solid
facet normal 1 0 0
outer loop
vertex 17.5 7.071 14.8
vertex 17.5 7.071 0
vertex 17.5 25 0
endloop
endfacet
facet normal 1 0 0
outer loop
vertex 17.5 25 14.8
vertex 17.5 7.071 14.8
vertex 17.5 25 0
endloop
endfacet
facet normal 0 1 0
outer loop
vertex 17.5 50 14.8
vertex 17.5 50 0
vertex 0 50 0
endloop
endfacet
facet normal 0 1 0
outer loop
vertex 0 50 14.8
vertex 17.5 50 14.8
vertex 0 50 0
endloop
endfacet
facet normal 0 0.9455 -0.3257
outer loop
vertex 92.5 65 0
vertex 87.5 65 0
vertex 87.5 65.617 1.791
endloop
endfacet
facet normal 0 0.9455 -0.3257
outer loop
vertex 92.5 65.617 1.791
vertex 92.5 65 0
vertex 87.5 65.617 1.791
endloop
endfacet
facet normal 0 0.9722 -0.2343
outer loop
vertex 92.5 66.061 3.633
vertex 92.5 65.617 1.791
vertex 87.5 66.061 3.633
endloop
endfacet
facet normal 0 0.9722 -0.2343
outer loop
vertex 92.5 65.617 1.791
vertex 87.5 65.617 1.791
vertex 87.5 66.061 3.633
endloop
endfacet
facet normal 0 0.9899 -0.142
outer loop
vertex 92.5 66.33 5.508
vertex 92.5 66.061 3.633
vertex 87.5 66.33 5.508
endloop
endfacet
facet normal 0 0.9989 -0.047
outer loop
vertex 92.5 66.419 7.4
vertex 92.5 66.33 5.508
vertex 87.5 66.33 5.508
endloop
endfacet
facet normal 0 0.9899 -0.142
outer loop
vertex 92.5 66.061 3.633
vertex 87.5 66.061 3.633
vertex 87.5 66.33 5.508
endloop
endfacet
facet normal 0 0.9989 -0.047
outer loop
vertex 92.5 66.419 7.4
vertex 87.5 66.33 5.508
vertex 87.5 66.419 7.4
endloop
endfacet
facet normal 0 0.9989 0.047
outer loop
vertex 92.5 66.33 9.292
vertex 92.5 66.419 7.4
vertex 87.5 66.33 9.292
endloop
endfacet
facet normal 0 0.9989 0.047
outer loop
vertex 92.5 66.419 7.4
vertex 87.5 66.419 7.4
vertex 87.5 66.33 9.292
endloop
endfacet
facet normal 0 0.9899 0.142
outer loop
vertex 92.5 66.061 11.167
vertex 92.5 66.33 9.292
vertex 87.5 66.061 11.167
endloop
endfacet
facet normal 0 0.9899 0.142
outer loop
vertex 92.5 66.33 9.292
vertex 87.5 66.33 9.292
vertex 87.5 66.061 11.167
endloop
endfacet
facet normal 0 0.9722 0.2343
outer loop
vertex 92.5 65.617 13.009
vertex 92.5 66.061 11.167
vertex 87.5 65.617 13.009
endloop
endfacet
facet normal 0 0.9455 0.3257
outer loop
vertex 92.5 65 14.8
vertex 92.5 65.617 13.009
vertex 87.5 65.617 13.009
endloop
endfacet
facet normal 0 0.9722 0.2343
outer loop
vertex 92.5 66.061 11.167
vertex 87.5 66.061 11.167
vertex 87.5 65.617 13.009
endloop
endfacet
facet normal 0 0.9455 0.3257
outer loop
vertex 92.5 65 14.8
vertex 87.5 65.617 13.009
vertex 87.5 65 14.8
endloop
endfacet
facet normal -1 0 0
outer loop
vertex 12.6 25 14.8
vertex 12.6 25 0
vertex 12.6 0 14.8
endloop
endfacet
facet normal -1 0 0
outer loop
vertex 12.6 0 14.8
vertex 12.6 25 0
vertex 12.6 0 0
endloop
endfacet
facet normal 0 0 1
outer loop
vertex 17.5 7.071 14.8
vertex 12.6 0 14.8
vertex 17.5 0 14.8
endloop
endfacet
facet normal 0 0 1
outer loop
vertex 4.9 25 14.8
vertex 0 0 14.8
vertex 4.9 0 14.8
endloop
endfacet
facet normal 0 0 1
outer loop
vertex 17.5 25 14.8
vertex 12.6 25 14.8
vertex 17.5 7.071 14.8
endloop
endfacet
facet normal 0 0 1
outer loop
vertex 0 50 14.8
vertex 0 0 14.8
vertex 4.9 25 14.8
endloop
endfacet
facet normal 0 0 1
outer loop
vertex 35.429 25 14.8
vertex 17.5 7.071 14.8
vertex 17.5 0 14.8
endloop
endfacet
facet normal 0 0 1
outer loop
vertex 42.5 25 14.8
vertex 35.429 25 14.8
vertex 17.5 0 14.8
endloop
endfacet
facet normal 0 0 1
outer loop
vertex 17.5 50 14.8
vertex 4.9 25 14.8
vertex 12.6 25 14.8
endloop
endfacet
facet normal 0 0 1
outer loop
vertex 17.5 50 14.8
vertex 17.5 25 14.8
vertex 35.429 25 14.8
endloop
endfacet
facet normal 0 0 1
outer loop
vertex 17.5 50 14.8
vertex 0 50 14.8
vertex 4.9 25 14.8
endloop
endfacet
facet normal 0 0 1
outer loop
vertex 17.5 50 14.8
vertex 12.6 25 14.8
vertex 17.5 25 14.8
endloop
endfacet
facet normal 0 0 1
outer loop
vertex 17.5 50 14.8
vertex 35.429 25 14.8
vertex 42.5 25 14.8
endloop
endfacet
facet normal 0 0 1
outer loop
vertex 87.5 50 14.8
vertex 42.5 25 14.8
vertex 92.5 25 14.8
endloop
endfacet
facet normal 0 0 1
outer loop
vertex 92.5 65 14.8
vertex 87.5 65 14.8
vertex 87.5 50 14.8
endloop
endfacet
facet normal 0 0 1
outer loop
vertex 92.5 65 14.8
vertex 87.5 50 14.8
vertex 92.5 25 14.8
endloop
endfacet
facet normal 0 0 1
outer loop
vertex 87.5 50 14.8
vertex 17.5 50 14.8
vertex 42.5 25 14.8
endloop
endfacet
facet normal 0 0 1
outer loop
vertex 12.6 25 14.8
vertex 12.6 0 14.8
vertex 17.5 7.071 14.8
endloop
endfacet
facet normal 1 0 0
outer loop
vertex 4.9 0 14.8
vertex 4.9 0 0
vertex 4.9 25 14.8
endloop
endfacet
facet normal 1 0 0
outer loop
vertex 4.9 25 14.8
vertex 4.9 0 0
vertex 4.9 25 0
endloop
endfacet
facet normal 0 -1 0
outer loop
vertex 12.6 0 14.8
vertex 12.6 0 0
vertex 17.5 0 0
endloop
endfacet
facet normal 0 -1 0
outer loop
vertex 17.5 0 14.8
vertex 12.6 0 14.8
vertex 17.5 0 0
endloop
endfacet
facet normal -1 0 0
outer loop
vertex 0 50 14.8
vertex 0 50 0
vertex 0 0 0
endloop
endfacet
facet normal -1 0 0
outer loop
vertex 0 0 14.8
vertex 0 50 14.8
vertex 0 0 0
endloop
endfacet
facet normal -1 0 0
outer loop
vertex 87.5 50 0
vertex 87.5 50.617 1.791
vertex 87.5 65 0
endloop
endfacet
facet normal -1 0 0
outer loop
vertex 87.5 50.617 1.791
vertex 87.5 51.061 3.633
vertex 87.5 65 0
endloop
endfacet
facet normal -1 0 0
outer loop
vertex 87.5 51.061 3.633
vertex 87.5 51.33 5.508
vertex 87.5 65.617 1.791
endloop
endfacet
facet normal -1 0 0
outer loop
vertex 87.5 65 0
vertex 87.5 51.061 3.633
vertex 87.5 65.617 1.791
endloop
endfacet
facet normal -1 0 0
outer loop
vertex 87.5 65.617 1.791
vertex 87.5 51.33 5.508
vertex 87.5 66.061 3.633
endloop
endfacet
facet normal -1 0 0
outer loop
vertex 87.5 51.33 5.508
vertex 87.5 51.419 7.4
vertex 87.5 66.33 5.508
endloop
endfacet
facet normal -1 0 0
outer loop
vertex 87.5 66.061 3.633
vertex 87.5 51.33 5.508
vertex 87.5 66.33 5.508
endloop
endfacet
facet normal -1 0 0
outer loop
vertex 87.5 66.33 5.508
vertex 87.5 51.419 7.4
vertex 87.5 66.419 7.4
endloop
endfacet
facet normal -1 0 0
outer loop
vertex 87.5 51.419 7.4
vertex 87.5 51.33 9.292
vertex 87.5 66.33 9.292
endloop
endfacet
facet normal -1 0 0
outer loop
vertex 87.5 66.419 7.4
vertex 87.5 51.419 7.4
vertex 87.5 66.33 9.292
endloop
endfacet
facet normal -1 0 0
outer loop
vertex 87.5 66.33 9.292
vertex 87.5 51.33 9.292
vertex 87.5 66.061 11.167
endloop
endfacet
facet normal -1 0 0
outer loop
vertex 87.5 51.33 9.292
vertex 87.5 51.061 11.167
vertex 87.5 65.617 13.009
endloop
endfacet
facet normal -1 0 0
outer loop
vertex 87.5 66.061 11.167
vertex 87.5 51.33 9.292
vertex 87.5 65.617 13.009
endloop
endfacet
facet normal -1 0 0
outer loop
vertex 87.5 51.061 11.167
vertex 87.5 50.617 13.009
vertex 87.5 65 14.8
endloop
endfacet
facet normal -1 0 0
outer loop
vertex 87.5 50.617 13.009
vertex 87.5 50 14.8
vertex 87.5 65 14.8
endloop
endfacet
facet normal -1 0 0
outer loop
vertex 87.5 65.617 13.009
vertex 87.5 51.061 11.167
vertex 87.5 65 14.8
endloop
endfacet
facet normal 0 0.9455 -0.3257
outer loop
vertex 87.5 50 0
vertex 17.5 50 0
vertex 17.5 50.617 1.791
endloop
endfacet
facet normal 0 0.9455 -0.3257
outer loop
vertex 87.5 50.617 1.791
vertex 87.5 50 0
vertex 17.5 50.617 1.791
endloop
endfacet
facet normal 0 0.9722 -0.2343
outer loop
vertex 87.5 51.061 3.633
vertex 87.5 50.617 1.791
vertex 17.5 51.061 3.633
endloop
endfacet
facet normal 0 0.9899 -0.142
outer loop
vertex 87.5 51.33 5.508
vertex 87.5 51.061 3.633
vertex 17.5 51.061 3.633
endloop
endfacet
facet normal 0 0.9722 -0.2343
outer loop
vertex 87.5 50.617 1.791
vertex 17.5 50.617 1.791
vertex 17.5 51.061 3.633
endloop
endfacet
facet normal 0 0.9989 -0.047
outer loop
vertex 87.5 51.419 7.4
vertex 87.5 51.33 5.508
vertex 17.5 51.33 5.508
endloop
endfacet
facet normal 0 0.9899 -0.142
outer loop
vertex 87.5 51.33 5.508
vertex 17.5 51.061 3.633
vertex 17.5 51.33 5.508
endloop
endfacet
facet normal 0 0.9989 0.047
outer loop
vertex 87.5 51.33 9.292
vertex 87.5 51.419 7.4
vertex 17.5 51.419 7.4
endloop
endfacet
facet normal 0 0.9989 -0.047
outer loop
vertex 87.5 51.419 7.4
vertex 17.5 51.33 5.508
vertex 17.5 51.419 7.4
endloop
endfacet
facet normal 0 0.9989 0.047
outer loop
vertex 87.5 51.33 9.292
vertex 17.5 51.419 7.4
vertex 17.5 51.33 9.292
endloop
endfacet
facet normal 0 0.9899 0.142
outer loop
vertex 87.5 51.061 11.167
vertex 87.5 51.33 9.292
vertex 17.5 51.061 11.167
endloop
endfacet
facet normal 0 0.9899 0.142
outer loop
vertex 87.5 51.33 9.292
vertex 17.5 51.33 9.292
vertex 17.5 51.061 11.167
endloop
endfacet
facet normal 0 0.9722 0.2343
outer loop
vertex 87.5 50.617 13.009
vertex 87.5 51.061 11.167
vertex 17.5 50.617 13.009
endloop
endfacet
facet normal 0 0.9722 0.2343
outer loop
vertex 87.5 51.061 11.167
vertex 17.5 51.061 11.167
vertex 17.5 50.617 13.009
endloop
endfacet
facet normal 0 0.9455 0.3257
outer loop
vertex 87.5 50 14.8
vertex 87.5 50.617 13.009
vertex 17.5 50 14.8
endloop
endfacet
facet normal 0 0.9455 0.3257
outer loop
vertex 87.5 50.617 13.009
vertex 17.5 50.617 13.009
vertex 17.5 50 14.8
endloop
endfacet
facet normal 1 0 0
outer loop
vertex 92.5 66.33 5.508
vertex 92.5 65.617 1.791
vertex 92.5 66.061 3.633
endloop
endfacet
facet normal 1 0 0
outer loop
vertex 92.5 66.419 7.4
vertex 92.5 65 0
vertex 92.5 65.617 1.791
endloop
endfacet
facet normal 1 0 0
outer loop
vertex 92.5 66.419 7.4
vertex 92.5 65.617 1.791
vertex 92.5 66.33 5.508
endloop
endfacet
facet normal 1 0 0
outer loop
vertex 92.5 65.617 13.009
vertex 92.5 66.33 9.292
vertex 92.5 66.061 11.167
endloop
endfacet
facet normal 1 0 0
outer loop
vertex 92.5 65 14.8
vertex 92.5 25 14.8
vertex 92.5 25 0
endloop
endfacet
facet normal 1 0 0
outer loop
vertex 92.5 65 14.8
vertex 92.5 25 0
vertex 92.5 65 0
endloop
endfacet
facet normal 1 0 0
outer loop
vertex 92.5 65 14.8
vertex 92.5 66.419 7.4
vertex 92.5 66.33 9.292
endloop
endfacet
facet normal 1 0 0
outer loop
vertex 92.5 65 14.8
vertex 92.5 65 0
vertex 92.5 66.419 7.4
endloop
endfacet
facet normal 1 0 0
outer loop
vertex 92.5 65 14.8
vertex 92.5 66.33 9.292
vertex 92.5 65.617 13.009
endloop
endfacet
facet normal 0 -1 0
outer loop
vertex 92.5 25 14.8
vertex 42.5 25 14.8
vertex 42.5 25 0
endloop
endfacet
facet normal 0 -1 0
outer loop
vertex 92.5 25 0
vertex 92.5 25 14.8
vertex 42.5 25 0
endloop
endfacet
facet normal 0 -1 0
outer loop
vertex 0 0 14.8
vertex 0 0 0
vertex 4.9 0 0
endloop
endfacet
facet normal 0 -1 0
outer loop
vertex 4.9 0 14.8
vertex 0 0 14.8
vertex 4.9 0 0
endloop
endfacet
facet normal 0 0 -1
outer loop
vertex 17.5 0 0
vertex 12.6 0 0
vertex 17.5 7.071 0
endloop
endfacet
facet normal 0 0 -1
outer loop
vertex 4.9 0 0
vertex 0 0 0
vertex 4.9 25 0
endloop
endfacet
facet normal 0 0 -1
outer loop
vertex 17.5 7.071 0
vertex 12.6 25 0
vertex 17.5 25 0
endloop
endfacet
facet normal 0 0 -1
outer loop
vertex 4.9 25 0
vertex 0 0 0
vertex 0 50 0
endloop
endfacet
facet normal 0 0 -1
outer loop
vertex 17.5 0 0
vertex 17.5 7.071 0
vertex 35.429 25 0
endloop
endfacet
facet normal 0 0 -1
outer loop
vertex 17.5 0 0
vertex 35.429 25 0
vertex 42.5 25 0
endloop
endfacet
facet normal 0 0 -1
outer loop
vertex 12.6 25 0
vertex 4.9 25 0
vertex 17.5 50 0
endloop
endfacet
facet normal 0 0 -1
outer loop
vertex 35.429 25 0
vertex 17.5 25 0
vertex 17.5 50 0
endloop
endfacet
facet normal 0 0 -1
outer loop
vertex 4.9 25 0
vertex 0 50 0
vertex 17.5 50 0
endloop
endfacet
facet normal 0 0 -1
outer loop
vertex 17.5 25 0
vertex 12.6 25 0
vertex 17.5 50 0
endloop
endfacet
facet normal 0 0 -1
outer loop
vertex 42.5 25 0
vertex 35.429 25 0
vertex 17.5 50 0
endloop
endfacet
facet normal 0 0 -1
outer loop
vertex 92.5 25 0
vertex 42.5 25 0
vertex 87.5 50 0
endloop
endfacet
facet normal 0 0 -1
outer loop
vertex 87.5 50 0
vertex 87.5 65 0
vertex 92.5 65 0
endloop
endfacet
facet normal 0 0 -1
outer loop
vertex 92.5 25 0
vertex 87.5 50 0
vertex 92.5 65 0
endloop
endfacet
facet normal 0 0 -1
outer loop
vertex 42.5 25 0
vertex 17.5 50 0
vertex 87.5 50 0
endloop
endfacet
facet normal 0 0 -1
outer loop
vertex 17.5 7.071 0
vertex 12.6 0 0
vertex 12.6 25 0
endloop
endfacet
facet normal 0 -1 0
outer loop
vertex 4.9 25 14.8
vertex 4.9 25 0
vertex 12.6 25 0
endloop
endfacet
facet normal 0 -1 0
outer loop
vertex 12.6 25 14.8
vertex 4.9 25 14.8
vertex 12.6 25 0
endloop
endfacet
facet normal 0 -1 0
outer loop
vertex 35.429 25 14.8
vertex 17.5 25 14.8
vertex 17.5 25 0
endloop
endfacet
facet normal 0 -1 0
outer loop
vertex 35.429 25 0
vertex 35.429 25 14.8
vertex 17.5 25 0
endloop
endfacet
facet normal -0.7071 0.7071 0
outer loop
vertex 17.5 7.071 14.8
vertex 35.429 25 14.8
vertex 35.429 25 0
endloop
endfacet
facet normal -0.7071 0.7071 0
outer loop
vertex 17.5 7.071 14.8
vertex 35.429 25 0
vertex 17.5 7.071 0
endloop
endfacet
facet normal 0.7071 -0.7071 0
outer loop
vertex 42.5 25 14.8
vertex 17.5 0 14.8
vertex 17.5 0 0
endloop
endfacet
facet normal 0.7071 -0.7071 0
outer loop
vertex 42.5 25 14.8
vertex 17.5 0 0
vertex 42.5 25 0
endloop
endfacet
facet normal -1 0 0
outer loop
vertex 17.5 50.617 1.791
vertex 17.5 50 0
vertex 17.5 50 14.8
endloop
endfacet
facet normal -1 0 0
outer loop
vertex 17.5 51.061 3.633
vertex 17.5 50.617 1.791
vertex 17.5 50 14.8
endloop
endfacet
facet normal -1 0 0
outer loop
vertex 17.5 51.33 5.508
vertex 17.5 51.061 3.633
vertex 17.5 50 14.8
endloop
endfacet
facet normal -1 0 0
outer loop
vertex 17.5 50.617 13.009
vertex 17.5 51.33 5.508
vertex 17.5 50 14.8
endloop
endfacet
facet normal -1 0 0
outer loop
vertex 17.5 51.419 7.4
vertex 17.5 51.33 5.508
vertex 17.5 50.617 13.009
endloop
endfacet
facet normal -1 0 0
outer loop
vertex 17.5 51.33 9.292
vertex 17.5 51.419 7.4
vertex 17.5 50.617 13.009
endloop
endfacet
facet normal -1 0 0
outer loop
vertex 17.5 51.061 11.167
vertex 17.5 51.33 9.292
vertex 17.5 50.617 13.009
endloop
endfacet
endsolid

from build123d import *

# Parameters (mm, degrees)
F1_DEPTH = 14.8
F3_DEPTH = 70
F5_DEPTH = 5
F7_DEPTH = 14.8


with BuildPart() as f1:
    # F0 (on Top) → F1 (new body)
    with BuildSketch(Plane.XY):
        Polygon((0, 50), (0, 0), (4.9, 0), (4.9, 25), (12.6, 25), (12.6, 0), (17.5, 0), (17.5, 50), align=None)
    extrude(amount=F1_DEPTH)

    # F2 (on face) → F3 (join)
    with BuildSketch(Plane.YZ.offset(17.5)):
        with BuildLine():
            ThreePointArc((50, 0), (51.419365, 7.4), (50, 14.8))
            Line((50, 14.8), (25, 14.8))
            Line((25, 14.8), (25, 0))
            Line((25, 0), (50, 0))
        make_face()
    extrude(amount=F3_DEPTH)

    # F4 (on face) → F5 (join)
    with BuildSketch(Plane.YZ.offset(87.5)):
        with BuildLine():
            Line((65, 14.8), (25, 14.8))
            Line((25, 14.8), (25, 0))
            Line((25, 0), (65, 0))
            ThreePointArc((65, 0), (66.419365, 7.4), (65, 14.8))
        make_face()
    extrude(amount=F5_DEPTH)

    # F6 (on face) → F7 (join, through all)
    with BuildSketch(Plane.XY.offset(14.8)):
        Polygon((17.5, 7.071068), (17.5, 0), (42.5, 25), (35.428932, 25), align=None)
    extrude(amount=-F7_DEPTH)


solid = f1.part
